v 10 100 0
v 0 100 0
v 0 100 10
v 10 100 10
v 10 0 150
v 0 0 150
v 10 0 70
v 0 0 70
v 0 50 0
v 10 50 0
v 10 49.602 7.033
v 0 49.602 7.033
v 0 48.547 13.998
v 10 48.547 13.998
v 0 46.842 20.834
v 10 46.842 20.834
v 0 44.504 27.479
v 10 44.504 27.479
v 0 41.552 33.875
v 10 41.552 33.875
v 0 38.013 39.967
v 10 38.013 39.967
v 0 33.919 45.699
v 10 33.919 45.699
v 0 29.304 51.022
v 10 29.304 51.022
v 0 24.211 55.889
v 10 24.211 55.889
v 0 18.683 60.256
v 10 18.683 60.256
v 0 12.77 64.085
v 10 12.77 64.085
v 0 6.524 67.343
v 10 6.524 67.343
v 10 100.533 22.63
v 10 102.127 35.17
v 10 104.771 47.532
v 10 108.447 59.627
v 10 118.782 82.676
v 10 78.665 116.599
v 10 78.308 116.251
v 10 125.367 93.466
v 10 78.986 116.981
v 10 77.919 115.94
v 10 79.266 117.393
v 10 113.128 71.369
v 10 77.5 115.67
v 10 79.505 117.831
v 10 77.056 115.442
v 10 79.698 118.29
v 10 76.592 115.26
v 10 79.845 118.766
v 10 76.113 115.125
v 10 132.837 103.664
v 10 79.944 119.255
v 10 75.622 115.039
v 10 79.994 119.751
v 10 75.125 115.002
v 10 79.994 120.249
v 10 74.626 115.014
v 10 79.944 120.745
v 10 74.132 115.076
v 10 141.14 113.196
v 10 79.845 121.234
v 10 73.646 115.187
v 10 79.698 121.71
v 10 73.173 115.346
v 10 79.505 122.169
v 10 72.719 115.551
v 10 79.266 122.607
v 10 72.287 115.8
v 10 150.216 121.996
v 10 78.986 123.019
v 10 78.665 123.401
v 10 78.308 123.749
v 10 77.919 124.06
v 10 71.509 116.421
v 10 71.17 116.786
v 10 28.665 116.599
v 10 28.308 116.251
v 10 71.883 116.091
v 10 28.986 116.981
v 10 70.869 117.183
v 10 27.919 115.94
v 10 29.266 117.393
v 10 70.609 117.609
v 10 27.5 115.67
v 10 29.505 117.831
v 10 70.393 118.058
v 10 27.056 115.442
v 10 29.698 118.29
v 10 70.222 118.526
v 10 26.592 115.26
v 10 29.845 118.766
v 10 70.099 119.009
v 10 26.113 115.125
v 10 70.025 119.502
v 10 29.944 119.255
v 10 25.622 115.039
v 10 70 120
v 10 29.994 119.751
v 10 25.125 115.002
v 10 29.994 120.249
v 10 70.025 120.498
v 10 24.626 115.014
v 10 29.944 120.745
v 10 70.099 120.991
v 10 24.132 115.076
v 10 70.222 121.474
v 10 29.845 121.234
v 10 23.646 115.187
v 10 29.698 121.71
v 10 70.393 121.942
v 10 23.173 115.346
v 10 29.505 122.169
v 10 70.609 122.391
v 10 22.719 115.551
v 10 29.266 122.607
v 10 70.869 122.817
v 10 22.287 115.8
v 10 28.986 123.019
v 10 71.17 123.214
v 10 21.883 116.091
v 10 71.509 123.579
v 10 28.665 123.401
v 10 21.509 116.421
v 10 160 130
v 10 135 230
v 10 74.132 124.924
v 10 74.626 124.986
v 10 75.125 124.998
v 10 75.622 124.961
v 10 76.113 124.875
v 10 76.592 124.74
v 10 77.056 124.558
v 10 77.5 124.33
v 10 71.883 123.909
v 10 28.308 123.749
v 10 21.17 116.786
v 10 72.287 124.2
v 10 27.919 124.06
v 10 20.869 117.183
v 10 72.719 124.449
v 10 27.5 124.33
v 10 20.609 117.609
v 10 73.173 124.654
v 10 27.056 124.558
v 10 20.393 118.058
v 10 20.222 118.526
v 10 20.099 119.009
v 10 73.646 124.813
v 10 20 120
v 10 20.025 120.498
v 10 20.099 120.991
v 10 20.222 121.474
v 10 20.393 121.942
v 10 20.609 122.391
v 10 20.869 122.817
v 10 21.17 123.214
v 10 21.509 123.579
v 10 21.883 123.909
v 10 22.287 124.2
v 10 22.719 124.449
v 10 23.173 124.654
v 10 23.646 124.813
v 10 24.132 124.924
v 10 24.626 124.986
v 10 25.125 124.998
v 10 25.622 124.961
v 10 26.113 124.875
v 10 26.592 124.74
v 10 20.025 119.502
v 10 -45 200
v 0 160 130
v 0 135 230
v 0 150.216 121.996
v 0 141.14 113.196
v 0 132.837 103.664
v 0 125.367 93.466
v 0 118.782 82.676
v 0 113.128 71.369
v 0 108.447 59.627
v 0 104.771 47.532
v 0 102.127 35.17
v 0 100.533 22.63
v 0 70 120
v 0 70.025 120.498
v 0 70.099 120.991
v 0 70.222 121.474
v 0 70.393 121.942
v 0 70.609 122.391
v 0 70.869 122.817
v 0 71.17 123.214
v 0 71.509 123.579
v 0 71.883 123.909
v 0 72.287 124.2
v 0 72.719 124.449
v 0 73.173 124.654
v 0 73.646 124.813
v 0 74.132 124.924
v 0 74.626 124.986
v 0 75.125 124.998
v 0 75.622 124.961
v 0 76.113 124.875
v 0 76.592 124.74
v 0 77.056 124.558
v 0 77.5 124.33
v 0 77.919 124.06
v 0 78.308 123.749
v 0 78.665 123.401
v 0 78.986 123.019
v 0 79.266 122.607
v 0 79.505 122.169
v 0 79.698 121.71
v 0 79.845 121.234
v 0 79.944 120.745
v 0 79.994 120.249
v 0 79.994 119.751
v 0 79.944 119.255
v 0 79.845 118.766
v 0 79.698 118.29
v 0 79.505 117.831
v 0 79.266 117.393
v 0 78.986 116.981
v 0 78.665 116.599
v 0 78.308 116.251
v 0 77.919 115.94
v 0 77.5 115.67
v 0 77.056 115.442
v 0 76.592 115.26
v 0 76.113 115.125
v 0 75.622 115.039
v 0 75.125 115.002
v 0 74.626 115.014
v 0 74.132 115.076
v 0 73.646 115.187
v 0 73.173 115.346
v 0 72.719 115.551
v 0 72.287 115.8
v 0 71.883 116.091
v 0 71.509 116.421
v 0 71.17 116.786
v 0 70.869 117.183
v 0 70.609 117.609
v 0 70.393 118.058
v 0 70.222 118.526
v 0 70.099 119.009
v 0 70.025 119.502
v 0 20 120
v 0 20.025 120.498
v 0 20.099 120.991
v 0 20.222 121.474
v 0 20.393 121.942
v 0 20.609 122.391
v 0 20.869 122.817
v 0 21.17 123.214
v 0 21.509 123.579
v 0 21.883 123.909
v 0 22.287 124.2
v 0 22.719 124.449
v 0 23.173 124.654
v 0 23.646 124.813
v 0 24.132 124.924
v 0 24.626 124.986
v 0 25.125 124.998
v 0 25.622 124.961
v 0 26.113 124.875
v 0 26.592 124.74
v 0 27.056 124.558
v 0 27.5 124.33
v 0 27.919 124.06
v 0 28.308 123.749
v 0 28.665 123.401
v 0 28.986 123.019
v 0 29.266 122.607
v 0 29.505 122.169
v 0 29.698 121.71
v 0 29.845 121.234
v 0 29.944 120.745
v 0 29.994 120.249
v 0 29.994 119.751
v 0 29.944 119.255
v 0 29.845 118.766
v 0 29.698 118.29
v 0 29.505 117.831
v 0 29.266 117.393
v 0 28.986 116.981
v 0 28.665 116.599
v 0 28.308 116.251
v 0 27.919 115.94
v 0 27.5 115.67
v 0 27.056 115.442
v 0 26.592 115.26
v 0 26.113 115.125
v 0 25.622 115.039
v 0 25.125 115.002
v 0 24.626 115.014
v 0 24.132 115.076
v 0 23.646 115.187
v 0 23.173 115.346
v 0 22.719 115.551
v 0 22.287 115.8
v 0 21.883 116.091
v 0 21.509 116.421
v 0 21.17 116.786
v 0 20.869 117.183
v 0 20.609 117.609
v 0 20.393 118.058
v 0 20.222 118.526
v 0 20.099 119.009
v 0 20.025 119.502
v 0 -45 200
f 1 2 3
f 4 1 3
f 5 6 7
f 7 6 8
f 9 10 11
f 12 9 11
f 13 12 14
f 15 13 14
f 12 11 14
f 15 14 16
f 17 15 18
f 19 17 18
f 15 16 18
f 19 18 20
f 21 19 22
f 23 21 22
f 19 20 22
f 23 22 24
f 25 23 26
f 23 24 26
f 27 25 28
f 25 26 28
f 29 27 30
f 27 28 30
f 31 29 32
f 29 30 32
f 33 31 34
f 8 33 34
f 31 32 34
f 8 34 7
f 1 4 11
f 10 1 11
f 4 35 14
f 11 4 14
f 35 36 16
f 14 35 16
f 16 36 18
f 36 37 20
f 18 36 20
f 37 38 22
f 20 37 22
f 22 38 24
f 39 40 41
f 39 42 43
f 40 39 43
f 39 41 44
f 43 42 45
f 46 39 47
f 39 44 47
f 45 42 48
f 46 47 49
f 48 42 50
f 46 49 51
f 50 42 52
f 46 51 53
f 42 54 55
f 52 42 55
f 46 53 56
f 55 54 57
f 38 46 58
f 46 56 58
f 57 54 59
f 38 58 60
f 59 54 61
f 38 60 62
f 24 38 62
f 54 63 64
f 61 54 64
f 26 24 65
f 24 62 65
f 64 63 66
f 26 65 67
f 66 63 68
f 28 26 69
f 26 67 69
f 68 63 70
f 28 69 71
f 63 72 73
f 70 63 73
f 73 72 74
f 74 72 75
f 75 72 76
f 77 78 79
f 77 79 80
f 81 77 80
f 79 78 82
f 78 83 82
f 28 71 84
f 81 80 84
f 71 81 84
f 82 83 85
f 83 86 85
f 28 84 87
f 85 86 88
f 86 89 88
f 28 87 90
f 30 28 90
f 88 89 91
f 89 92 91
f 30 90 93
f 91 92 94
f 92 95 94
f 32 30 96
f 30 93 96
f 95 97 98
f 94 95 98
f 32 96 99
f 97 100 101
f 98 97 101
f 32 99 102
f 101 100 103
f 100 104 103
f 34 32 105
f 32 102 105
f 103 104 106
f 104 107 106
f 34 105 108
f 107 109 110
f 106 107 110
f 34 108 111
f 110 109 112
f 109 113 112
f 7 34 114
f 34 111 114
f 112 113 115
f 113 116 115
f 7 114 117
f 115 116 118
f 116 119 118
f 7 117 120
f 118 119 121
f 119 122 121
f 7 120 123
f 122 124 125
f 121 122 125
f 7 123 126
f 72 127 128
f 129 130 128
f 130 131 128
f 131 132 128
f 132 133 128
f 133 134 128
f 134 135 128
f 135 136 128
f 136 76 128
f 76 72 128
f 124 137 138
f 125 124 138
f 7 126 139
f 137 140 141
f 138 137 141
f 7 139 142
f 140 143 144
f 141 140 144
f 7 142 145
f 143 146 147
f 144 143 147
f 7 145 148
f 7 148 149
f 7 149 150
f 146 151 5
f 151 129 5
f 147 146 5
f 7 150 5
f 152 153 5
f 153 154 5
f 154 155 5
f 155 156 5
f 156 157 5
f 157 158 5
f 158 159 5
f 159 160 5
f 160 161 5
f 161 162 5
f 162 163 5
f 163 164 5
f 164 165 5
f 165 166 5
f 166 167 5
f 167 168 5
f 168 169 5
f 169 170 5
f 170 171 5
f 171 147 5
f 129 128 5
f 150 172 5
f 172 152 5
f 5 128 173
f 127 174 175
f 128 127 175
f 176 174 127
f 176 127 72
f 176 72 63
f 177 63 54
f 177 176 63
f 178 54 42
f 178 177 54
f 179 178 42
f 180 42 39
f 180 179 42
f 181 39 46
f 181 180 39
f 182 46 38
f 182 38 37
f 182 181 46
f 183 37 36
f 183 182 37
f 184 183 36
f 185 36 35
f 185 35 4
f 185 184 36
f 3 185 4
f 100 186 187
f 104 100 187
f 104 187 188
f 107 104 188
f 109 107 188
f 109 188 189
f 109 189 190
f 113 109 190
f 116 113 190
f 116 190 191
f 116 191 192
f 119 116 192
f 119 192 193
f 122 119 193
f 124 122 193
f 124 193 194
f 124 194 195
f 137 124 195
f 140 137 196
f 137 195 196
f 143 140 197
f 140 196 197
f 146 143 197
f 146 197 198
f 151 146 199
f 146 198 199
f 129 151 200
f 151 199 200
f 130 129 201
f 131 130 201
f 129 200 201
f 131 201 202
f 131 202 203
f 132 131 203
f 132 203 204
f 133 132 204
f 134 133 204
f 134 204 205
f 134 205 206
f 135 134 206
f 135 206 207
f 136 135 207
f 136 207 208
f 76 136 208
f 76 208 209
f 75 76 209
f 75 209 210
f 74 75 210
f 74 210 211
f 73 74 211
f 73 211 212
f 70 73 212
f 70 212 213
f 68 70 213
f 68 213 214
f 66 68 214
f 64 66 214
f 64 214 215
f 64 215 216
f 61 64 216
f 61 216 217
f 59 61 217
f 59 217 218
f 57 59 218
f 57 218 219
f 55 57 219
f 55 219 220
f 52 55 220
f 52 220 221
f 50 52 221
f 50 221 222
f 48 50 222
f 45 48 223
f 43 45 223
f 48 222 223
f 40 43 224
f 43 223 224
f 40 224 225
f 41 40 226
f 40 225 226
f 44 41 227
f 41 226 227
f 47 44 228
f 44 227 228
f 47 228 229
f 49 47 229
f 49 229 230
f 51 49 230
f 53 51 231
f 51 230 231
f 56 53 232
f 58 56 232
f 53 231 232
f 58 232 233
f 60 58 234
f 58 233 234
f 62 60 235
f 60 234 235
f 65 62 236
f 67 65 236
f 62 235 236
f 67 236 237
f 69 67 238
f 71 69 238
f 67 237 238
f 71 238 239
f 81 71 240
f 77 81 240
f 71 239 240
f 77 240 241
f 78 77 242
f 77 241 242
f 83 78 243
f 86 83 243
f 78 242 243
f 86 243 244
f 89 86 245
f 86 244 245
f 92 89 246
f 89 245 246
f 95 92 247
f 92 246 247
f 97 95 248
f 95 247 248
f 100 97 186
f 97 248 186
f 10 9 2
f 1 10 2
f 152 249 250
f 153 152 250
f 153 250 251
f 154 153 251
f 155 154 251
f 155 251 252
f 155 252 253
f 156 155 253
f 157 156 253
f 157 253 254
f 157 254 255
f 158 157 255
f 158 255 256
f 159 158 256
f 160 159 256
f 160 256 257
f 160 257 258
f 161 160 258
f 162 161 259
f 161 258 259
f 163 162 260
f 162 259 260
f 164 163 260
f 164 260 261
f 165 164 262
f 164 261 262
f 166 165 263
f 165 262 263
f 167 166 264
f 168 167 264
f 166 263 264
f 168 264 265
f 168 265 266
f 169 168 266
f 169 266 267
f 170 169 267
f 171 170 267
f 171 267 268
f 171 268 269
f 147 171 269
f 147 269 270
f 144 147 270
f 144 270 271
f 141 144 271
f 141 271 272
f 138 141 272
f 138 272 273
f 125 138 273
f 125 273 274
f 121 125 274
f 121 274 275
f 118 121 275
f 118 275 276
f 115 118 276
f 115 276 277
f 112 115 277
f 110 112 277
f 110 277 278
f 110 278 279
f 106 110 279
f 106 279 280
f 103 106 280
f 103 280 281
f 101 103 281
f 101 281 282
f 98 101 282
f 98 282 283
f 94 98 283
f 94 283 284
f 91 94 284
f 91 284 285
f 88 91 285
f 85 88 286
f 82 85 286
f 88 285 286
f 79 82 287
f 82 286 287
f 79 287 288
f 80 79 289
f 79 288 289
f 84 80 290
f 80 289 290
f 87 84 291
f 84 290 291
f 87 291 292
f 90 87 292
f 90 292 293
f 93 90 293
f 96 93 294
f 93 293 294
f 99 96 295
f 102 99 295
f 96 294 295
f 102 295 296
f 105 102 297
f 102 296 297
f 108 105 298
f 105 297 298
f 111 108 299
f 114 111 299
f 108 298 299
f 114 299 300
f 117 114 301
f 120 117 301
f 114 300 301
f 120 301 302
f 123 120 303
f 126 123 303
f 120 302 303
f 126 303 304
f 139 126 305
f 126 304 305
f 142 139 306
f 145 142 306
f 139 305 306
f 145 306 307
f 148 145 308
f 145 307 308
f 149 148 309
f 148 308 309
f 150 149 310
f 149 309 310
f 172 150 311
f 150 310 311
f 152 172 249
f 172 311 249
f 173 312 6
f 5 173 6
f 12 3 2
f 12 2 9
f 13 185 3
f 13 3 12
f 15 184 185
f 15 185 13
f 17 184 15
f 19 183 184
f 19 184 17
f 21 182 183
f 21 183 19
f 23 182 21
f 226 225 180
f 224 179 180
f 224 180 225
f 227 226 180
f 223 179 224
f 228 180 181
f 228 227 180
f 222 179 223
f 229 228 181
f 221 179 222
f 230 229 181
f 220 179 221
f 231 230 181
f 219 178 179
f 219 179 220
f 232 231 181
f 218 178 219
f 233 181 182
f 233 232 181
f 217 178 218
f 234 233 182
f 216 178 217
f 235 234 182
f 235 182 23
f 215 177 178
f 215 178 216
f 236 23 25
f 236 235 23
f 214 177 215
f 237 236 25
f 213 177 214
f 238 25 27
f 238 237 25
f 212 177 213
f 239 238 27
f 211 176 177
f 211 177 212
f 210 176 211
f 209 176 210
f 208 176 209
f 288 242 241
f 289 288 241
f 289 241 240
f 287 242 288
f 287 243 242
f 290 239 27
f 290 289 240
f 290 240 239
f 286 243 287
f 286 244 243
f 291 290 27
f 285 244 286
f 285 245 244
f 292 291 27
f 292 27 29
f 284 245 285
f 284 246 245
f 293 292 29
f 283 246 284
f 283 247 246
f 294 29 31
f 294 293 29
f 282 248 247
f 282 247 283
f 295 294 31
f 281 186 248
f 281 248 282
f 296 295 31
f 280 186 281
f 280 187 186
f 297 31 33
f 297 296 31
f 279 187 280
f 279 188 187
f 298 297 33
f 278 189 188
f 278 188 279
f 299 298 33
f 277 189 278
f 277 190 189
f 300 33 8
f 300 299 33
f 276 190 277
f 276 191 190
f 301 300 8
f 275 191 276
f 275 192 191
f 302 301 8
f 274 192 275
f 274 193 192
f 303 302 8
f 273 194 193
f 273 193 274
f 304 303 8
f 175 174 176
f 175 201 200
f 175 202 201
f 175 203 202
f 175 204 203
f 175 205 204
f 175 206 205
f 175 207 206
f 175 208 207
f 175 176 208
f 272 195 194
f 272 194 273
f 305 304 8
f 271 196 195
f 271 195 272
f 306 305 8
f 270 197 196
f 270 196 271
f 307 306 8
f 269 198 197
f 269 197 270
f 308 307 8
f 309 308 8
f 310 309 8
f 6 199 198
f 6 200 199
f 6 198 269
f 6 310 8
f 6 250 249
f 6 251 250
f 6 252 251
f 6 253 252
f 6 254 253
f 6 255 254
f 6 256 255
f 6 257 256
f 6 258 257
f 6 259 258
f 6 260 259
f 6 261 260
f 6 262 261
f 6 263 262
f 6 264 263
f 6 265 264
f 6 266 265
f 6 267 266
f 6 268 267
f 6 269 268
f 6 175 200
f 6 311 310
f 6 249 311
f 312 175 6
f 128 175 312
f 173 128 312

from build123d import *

# Parameters (mm, degrees)
F1_DEPTH    = 10
F3_D        = 10
F3_DEPTH    = 100
F3_TIP      = 3.0043030951
F5_DEPTH    = 25
F6_T1_DEPTH = 10


# Not quite as in the source:
# - a fillet or chamfer that OpenCascade refuses, or shapes differently, is made with other operations: its cross-section is extruded or revolved along the edge and cut away or added


with BuildPart() as f1:
    # F0 (on Right) → F1 (new body)
    with BuildSketch(Plane.YZ):
        Polygon((0, 150), (0, 0), (100, 0), (100, 100), (100, 200), (0, 200), align=None)
        Polygon((-45, 200), (0, 150), (0, 200), (100, 200), (100, 100), (160, 130), (135, 230), align=None)
    extrude(amount=F1_DEPTH)

    # F3
    with Locations(Plane.YZ.offset(10)):
        with Locations((25, 120), (75, 120)):
            Hole(F3_D / 2, depth=F3_DEPTH)
            with Locations((0, 0, -(F3_DEPTH + F3_TIP / 2))):  # 118° drill point
                Cone(0, F3_D / 2, F3_TIP, mode=Mode.SUBTRACT)

    # F4 (on face) → F5 (cut)
    with BuildSketch(Plane.YZ.offset(10)):
        with BuildLine():
            Line((0, 0), (50, 0))
            ThreePointArc((50, 0), (36.033388833, 42.8809920236), (0, 70))
            Line((0, 70), (0, 0))
        make_face()
    extrude(amount=-F5_DEPTH, mode=Mode.SUBTRACT)

    # F6: fillet of radius 150 on 1 edges, made by hand

    # F6_s2 → F6_t1 (join)
    with BuildSketch(Plane.YZ):
        with BuildLine():
            ThreePointArc((160, 130), (115.83592135, 77.082039325), (100, 10))
            Line((100, 10), (100, 100))
            Line((100, 100), (160, 130))
        make_face()
    extrude(amount=F6_T1_DEPTH)


solid = f1.part
